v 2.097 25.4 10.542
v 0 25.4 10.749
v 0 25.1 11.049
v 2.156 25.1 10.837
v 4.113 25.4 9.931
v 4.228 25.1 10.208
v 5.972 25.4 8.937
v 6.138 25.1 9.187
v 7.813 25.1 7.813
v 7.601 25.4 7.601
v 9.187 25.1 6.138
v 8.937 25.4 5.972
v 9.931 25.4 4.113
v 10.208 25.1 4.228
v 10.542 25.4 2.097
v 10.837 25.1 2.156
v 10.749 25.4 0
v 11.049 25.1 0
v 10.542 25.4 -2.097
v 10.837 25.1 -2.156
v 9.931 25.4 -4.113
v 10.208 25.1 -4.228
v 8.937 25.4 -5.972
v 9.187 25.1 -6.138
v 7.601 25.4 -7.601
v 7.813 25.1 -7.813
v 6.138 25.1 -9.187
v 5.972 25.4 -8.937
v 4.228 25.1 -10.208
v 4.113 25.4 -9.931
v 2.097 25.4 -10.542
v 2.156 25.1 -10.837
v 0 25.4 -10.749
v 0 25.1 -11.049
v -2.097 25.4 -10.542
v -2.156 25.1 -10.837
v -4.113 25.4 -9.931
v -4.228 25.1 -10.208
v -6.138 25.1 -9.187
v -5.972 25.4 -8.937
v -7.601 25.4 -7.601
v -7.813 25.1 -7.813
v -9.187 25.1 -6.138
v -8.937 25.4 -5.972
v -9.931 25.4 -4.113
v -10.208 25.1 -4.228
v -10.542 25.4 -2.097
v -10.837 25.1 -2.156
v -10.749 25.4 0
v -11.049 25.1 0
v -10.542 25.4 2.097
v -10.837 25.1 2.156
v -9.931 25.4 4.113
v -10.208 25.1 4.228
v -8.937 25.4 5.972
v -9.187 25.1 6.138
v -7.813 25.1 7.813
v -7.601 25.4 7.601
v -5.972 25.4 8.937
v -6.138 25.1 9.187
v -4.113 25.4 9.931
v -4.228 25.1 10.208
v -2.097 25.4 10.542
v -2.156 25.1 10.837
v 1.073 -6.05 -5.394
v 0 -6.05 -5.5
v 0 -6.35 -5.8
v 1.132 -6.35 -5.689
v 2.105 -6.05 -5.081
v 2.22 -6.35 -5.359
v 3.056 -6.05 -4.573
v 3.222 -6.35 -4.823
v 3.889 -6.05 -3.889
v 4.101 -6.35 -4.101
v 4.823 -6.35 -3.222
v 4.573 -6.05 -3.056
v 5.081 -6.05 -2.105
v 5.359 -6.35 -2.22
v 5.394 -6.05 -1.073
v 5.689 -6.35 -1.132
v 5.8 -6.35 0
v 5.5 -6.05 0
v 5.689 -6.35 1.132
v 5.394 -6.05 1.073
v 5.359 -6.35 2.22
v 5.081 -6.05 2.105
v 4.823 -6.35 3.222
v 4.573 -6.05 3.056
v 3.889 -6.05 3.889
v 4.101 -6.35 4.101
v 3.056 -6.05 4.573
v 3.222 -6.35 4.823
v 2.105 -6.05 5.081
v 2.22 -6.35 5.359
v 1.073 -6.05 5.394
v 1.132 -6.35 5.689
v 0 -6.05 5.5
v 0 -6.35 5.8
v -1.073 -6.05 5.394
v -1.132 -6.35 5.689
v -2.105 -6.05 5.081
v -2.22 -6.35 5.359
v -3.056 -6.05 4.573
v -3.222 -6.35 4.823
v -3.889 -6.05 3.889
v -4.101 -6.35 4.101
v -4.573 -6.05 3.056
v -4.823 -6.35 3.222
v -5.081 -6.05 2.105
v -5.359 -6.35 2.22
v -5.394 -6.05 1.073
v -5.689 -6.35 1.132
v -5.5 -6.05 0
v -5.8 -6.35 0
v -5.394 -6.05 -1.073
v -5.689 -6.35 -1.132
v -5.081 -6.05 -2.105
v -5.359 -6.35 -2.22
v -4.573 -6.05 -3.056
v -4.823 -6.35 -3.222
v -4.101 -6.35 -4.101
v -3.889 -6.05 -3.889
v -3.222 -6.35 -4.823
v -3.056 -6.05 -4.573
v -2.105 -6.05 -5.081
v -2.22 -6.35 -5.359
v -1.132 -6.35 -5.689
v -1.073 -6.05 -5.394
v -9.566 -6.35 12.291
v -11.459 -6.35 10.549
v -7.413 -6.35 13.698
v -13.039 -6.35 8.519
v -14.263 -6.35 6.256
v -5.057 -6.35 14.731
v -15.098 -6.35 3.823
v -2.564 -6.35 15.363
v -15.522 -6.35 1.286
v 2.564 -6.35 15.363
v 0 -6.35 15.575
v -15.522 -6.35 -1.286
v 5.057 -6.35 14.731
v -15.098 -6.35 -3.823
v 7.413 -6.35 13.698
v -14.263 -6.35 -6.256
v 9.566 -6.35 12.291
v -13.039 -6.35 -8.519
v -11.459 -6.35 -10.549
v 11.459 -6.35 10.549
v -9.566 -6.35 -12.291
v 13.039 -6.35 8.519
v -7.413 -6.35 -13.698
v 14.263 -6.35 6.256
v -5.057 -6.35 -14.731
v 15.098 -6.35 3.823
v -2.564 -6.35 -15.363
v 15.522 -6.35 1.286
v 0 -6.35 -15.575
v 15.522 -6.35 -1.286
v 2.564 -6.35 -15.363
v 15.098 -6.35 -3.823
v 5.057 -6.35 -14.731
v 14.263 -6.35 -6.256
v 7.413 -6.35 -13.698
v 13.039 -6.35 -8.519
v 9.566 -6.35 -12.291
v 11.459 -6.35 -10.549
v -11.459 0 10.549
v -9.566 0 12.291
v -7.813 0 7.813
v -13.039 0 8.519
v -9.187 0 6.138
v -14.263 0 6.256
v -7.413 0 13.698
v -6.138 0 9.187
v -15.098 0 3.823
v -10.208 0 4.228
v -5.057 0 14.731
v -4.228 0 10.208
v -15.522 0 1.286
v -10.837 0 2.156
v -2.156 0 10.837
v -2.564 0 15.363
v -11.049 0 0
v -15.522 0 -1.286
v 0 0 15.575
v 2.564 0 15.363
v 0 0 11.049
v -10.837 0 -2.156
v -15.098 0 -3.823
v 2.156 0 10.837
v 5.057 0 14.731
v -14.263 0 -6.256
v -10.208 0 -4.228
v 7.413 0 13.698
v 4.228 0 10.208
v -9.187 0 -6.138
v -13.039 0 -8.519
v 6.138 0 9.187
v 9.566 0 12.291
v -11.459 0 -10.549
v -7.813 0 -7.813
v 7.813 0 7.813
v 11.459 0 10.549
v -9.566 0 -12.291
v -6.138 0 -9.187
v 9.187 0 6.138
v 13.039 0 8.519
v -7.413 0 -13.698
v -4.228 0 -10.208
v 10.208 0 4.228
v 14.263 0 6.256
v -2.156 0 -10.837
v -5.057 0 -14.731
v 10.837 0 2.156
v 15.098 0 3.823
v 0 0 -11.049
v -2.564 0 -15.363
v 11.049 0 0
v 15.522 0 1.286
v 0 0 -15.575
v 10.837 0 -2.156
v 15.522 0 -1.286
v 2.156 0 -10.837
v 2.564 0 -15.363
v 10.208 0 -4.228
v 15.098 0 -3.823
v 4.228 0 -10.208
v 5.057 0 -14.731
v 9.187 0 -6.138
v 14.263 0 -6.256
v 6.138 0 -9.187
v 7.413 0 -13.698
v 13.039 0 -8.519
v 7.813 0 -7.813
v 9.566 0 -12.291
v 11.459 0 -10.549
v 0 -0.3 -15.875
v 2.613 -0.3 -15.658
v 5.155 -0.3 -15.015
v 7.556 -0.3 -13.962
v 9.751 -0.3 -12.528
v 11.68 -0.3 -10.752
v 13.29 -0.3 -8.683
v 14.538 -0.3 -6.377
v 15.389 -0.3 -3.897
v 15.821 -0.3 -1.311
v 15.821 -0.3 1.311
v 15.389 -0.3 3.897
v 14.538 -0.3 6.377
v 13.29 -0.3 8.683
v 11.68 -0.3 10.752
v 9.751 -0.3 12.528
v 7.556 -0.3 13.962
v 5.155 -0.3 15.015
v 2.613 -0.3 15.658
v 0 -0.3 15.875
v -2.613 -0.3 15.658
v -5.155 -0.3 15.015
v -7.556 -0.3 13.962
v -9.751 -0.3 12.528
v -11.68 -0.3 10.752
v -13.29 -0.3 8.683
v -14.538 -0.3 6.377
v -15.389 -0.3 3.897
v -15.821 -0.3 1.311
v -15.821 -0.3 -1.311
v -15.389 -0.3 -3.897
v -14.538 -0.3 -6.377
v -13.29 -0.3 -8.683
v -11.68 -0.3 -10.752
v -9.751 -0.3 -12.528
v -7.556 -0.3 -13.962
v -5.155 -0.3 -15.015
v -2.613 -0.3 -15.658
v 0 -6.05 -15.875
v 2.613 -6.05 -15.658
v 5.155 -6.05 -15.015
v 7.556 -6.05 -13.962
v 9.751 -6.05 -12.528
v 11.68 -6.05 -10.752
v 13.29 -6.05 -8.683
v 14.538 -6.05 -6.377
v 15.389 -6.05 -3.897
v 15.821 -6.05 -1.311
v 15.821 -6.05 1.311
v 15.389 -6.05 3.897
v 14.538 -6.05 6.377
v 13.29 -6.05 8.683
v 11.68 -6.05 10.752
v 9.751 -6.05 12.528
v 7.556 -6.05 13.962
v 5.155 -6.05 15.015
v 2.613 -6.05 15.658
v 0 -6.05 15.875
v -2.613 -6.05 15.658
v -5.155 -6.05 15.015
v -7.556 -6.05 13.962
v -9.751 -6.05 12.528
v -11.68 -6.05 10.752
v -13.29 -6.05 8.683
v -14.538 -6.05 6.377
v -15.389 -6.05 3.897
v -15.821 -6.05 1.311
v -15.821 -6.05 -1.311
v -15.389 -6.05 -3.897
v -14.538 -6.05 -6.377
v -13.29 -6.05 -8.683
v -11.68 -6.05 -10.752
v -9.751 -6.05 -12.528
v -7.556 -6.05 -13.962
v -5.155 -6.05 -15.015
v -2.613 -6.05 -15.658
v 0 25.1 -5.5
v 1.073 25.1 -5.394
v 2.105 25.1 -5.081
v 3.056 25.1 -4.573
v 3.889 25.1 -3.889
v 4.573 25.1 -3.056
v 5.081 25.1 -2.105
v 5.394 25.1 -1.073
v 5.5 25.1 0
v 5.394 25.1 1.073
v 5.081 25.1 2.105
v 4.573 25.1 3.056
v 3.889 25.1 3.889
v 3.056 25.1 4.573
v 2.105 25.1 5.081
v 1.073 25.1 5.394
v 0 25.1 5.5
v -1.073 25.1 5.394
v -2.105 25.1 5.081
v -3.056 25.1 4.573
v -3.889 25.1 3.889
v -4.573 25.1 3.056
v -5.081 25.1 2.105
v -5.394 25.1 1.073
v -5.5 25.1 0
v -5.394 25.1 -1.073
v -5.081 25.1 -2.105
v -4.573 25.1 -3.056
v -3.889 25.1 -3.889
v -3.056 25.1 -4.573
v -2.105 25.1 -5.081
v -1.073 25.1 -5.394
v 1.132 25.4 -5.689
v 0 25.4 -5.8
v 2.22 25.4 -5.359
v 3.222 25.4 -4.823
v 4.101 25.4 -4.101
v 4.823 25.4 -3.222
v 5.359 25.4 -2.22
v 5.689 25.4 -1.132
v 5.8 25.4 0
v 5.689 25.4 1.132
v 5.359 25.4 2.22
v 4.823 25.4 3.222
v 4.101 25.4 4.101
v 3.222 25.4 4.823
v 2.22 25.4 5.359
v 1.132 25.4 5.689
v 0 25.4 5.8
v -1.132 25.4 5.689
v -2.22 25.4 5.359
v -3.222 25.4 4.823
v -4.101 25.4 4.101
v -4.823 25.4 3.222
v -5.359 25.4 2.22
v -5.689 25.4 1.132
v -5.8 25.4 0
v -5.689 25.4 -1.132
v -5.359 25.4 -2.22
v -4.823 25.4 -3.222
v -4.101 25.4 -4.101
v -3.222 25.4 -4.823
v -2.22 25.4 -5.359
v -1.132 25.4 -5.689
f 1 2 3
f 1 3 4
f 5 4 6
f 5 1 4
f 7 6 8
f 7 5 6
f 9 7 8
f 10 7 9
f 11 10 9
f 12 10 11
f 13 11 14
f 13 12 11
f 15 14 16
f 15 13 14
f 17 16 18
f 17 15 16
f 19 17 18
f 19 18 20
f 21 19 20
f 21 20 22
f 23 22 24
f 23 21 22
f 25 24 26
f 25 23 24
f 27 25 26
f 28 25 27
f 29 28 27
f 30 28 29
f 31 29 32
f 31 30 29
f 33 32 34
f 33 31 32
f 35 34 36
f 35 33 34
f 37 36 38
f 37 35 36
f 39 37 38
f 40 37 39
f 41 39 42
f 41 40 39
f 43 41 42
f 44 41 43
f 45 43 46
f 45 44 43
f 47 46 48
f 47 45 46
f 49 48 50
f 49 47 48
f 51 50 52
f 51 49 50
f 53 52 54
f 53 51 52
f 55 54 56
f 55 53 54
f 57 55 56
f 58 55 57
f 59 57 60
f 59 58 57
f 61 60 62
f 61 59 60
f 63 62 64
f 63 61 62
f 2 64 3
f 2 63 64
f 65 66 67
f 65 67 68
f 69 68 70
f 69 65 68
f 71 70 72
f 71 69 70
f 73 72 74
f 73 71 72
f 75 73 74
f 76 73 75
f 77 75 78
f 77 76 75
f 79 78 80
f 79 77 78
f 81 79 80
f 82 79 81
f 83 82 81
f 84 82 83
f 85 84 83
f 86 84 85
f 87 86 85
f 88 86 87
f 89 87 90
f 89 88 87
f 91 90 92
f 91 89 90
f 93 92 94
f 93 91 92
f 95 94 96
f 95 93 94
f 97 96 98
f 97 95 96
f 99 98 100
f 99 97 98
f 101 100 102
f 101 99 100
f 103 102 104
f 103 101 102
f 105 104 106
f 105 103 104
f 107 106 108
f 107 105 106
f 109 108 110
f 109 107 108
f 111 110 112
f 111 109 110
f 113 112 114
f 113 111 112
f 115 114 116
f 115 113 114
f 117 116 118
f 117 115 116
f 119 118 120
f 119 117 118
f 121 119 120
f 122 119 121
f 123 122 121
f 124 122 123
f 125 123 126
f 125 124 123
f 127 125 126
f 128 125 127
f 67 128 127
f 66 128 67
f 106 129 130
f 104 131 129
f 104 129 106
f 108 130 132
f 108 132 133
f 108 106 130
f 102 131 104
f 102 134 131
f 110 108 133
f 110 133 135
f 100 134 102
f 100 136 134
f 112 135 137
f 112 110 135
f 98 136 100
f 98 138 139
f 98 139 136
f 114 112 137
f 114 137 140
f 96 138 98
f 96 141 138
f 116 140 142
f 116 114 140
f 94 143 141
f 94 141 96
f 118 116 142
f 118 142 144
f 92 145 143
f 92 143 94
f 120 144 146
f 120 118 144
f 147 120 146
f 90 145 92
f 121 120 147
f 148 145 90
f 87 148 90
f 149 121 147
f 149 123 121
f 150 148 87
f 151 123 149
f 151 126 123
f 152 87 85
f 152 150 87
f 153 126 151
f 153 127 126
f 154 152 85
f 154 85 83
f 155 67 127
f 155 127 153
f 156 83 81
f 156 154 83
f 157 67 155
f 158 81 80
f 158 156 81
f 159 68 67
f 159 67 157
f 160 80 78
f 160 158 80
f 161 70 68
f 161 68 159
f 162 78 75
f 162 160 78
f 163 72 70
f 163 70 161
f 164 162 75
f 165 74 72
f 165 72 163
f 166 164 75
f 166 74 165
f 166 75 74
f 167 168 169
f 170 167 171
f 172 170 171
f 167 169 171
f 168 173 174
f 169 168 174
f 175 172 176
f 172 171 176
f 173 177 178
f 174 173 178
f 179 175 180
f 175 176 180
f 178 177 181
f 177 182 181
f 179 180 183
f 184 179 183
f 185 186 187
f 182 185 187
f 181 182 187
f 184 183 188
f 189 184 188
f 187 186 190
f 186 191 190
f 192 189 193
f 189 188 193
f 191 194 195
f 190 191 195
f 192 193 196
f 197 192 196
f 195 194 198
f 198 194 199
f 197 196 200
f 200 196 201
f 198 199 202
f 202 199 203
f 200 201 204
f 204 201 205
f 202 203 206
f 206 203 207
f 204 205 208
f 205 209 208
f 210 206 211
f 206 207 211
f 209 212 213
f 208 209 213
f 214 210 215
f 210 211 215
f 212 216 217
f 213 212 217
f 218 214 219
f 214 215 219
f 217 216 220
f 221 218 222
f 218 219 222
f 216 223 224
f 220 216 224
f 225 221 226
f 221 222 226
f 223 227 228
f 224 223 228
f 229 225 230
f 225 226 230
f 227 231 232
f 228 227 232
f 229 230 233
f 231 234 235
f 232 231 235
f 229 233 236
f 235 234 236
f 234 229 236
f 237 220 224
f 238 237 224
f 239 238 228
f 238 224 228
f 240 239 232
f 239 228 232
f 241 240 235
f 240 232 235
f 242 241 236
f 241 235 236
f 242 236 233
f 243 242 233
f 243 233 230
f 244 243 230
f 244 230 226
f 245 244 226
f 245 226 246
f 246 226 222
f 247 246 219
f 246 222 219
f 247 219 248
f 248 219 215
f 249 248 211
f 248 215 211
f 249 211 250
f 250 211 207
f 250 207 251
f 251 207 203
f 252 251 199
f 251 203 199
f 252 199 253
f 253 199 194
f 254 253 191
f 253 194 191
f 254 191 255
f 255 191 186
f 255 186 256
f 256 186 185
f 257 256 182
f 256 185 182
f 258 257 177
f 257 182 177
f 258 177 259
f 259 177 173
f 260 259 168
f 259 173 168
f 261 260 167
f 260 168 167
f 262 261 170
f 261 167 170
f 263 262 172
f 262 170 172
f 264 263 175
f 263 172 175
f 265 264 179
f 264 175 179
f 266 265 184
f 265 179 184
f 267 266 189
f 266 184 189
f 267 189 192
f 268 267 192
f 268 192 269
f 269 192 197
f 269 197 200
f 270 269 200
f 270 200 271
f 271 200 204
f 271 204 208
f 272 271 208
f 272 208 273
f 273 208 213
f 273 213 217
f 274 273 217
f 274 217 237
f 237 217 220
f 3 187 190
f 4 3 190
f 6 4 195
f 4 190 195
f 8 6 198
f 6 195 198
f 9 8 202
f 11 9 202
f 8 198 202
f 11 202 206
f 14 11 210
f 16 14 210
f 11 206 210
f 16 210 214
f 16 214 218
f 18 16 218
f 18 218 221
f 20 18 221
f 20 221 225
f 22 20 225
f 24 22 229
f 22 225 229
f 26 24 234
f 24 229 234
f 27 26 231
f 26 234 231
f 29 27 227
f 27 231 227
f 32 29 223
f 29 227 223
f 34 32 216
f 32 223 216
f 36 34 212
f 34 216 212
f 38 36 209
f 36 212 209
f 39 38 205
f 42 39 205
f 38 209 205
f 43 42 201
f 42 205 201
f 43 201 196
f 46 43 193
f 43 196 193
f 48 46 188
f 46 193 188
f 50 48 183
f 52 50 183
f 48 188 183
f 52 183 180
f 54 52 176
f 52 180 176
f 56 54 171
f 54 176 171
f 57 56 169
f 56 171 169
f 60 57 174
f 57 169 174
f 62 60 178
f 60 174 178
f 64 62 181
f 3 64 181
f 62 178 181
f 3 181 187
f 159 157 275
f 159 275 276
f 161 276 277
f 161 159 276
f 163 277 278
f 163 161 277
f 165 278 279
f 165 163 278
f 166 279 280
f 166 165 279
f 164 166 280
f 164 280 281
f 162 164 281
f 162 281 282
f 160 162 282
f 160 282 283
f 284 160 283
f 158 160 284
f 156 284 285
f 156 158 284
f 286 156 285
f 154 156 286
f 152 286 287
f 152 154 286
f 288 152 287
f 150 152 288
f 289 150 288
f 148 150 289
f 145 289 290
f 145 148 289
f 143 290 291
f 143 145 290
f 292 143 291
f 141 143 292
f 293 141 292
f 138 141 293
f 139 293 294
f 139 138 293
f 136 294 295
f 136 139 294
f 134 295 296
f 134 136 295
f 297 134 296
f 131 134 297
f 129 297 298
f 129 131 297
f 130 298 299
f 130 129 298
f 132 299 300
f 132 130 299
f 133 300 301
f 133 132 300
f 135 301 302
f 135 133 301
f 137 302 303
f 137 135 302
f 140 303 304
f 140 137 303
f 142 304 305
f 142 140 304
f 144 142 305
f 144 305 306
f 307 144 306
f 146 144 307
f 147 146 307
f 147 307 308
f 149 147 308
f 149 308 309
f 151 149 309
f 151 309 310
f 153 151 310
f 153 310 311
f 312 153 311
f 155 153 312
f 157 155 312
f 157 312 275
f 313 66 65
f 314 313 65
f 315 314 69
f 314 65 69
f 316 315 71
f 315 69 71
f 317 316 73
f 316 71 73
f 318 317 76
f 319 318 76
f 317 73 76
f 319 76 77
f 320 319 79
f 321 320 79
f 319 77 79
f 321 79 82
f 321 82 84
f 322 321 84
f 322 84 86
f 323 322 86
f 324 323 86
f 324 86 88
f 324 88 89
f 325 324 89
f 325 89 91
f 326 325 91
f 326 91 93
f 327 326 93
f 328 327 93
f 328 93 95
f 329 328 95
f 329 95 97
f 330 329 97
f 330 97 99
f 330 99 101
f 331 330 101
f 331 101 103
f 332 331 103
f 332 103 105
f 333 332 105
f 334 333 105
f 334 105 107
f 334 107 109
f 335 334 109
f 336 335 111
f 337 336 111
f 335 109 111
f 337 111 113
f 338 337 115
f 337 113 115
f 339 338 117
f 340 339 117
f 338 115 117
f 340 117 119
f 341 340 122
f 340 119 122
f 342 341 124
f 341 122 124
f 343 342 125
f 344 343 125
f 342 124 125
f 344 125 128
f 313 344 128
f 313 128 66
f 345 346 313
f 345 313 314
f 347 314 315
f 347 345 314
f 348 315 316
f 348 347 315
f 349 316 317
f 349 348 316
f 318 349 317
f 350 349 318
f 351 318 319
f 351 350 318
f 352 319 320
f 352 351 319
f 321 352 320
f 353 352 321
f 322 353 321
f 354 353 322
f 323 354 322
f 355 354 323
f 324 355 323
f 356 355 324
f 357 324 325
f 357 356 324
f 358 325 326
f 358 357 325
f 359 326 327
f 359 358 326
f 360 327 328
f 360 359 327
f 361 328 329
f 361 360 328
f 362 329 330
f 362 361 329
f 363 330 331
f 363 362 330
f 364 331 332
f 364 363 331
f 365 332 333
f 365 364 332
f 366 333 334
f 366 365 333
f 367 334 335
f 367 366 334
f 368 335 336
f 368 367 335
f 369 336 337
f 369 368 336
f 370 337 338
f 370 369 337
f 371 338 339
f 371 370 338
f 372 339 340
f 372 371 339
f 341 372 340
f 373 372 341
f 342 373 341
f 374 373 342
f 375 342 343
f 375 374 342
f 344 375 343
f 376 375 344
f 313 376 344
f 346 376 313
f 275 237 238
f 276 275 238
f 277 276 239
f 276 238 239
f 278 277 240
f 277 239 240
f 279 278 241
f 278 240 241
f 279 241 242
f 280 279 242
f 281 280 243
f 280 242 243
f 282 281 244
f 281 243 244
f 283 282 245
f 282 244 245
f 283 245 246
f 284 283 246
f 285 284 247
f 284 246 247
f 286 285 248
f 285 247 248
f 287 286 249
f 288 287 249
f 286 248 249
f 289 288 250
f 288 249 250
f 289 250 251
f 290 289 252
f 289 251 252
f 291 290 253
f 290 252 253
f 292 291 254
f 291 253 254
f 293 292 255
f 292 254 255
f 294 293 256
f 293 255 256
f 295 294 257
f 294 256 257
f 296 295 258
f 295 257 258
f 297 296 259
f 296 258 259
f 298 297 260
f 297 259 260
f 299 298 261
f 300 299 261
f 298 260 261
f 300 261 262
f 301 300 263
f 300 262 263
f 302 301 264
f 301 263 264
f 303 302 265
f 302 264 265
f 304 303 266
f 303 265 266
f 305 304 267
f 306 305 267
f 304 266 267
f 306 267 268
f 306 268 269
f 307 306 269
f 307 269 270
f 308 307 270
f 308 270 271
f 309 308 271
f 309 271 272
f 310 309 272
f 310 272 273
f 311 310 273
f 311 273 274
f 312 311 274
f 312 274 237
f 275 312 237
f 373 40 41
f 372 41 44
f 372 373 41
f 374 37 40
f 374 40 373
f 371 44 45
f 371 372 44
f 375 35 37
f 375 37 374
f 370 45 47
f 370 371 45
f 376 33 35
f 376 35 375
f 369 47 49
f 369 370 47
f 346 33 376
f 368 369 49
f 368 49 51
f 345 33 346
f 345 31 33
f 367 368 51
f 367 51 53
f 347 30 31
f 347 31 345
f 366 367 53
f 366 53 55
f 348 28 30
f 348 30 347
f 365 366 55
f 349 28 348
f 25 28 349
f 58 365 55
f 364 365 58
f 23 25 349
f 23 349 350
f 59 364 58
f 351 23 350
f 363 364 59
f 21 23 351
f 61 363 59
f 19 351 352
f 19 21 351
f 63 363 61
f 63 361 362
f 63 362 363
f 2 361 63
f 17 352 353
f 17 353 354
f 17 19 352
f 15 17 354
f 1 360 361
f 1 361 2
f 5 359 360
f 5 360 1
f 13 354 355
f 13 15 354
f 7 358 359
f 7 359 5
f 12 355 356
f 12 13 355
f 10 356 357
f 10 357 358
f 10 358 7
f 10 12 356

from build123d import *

# Parameters (mm, degrees)
SKETCH1_R           = 11.049
BOSS_EXTRUDE1_DEPTH = 25.4
SKETCH2_R           = 15.875
BOSS_EXTRUDE2_DEPTH = 6.35
SKETCH3_R           = 5.5
CUT_EXTRUDE1_DEPTH  = 39.885649667
CHAMFER1_SIZE       = 0.299999908


with BuildPart() as part:
    # Sketch1 → Boss-Extrude1 (new body)
    with BuildSketch(Plane(origin=(0, 0, 0), x_dir=(1, 0, 0), z_dir=(0, 1, 0))):
        with Locations(Location((0, 0, 0), (0, 0, 270))):
            Circle(SKETCH1_R)
    extrude(amount=BOSS_EXTRUDE1_DEPTH)

    # Sketch2 → Boss-Extrude2 (add)
    with BuildSketch(Plane.XZ):
        with Locations(Location((0, 0, 0), (0, 0, 270))):
            Circle(SKETCH2_R)
    extrude(amount=BOSS_EXTRUDE2_DEPTH)

    # Sketch3 → Cut-Extrude1 (cut, through all)
    with BuildSketch(Plane.XZ.offset(6.35)):
        with Locations(Location((0, 0, 0), (0, 0, 270))):
            Circle(SKETCH3_R)
    extrude(amount=-CUT_EXTRUDE1_DEPTH, mode=Mode.SUBTRACT)

    # Chamfer1
    chamfer1_edges = [part.edges().sort_by_distance(p)[0] for p in [
        (0, 25.4, 5.5),
        (0, -6.35, 5.5),
        (0, 25.4, -11.049),
        (0, 0, 15.875),
        (0, -6.35, 15.875),
    ]]
    chamfer(chamfer1_edges, length=CHAMFER1_SIZE)


solid = part.part
